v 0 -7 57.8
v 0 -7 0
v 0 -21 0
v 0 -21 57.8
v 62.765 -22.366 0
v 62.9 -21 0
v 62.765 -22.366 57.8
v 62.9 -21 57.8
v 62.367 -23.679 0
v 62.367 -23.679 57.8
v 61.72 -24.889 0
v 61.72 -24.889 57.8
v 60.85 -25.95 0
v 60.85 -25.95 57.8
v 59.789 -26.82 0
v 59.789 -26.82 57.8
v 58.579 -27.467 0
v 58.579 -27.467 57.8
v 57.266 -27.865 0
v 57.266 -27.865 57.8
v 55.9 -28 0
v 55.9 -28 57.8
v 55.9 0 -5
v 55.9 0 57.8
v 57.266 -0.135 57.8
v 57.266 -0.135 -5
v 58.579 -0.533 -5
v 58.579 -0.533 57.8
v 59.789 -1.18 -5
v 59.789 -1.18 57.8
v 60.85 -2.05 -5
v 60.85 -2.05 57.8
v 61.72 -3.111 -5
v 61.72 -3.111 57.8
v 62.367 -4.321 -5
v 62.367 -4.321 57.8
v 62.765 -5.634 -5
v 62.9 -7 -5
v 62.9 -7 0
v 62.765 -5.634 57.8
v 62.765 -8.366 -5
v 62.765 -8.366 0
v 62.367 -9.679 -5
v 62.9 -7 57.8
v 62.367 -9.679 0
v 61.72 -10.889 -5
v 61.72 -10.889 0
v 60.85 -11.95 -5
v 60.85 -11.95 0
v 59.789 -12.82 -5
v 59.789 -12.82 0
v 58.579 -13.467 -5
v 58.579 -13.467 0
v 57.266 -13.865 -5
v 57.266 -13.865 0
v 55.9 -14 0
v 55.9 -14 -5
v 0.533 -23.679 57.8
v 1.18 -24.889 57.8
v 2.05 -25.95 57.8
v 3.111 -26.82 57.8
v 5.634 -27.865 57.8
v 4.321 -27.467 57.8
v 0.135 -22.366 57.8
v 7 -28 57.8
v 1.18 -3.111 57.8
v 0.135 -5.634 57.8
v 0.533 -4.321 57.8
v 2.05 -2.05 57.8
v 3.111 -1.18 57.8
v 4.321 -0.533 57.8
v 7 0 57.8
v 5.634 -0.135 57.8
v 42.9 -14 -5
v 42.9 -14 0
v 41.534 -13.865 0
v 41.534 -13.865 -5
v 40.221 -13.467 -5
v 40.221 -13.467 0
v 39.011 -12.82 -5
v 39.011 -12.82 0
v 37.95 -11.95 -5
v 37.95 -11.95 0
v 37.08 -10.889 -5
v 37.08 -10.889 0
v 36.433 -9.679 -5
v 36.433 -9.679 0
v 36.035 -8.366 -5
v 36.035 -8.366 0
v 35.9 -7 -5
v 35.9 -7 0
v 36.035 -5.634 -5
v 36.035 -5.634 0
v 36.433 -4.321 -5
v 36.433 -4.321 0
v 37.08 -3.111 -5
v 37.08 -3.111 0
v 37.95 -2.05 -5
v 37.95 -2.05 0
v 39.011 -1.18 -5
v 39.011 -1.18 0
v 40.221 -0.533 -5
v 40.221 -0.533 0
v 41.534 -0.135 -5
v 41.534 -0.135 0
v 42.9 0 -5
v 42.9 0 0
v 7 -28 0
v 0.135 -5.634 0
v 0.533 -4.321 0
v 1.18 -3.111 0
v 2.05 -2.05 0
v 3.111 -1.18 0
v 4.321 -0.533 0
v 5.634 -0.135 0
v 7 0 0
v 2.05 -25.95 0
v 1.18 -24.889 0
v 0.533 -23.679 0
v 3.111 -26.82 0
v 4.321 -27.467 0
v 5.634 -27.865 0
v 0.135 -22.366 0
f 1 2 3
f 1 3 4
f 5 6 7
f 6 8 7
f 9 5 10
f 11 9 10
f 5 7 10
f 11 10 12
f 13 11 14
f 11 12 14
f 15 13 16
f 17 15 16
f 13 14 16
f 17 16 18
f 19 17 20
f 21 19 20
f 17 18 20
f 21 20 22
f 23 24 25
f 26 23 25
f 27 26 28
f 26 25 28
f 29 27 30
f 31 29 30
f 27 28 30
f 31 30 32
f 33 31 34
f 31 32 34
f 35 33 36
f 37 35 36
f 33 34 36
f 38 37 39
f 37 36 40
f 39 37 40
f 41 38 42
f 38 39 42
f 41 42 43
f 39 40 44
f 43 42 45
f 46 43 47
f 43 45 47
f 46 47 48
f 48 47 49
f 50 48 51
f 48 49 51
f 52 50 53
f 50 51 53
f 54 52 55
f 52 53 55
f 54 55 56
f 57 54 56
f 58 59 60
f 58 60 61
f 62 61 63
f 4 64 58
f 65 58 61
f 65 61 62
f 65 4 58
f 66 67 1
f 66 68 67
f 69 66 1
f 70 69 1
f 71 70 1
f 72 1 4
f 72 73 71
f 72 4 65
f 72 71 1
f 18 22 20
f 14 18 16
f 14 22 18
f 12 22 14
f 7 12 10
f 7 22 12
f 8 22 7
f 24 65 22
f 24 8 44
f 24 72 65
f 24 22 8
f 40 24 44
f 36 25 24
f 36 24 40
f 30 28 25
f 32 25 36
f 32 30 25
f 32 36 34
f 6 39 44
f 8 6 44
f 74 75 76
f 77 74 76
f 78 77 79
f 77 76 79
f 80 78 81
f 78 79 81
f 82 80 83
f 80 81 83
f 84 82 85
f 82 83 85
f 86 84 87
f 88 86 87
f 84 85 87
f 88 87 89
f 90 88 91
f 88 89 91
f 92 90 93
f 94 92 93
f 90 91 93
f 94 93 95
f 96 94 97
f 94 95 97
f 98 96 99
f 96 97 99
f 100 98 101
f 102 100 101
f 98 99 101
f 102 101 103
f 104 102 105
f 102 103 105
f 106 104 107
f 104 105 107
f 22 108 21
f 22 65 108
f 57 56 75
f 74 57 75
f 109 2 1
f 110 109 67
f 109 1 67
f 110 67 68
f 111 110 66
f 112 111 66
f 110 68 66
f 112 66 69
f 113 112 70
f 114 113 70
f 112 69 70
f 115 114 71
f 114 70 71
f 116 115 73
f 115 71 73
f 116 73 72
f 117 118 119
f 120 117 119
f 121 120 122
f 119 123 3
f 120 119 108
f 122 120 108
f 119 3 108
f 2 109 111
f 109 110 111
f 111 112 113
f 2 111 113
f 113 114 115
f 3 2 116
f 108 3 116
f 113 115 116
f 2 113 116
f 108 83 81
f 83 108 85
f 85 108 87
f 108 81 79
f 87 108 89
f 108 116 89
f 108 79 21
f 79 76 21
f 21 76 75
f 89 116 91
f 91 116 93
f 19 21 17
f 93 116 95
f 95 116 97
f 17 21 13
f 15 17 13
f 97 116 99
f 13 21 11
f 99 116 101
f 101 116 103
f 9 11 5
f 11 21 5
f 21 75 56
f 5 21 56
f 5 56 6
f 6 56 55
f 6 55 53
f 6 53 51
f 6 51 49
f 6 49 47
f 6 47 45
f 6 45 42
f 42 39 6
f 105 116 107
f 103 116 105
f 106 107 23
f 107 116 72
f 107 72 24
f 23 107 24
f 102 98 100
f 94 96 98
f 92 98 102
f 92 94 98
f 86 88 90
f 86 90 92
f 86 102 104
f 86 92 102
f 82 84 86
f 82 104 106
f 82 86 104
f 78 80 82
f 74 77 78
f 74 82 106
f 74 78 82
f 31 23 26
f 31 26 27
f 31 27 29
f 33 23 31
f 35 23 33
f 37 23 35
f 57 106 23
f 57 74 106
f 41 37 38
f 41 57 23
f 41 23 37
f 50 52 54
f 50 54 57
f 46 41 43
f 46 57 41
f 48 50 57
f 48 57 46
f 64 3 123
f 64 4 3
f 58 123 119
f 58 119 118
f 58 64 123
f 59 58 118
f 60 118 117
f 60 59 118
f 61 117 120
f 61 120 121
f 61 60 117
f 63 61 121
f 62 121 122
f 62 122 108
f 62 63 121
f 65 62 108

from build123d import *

# Parameters (mm, degrees)
F0_W     = 62.9
F0_H     = 57.8
F1_DEPTH = 28
F2_R     = 7
F4_DEPTH = 5


with BuildPart() as f1:
    # F0 (on Front) → F1 (new body)
    with BuildSketch(Plane.XZ):
        with Locations((31.45, 28.9)):
            Rectangle(F0_W, F0_H)
    extrude(amount=F1_DEPTH)

    # F2
    f2_edges = [f1.edges().sort_by_distance(p)[0] for p in [
        (0, -28, 28.9),
        (0, 0, 28.9),
        (62.9, -28, 28.9),
        (62.9, 0, 28.9),
    ]]
    fillet(f2_edges, radius=F2_R)

    # F3 (on face) → F4 (join)
    with BuildSketch(Plane(origin=(0, 0, 0), x_dir=(1, 0, 0), z_dir=(0, 0, -1))):
        with BuildLine():
            Line((55.9, 14), (42.9, 14))
            ThreePointArc((42.9, 14), (35.9, 7), (42.9, 0))
            Line((42.9, 0), (55.9, 0))
            ThreePointArc((55.9, 0), (62.9, 7), (55.9, 14))
        make_face()
    extrude(amount=F4_DEPTH)


solid = f1.part
